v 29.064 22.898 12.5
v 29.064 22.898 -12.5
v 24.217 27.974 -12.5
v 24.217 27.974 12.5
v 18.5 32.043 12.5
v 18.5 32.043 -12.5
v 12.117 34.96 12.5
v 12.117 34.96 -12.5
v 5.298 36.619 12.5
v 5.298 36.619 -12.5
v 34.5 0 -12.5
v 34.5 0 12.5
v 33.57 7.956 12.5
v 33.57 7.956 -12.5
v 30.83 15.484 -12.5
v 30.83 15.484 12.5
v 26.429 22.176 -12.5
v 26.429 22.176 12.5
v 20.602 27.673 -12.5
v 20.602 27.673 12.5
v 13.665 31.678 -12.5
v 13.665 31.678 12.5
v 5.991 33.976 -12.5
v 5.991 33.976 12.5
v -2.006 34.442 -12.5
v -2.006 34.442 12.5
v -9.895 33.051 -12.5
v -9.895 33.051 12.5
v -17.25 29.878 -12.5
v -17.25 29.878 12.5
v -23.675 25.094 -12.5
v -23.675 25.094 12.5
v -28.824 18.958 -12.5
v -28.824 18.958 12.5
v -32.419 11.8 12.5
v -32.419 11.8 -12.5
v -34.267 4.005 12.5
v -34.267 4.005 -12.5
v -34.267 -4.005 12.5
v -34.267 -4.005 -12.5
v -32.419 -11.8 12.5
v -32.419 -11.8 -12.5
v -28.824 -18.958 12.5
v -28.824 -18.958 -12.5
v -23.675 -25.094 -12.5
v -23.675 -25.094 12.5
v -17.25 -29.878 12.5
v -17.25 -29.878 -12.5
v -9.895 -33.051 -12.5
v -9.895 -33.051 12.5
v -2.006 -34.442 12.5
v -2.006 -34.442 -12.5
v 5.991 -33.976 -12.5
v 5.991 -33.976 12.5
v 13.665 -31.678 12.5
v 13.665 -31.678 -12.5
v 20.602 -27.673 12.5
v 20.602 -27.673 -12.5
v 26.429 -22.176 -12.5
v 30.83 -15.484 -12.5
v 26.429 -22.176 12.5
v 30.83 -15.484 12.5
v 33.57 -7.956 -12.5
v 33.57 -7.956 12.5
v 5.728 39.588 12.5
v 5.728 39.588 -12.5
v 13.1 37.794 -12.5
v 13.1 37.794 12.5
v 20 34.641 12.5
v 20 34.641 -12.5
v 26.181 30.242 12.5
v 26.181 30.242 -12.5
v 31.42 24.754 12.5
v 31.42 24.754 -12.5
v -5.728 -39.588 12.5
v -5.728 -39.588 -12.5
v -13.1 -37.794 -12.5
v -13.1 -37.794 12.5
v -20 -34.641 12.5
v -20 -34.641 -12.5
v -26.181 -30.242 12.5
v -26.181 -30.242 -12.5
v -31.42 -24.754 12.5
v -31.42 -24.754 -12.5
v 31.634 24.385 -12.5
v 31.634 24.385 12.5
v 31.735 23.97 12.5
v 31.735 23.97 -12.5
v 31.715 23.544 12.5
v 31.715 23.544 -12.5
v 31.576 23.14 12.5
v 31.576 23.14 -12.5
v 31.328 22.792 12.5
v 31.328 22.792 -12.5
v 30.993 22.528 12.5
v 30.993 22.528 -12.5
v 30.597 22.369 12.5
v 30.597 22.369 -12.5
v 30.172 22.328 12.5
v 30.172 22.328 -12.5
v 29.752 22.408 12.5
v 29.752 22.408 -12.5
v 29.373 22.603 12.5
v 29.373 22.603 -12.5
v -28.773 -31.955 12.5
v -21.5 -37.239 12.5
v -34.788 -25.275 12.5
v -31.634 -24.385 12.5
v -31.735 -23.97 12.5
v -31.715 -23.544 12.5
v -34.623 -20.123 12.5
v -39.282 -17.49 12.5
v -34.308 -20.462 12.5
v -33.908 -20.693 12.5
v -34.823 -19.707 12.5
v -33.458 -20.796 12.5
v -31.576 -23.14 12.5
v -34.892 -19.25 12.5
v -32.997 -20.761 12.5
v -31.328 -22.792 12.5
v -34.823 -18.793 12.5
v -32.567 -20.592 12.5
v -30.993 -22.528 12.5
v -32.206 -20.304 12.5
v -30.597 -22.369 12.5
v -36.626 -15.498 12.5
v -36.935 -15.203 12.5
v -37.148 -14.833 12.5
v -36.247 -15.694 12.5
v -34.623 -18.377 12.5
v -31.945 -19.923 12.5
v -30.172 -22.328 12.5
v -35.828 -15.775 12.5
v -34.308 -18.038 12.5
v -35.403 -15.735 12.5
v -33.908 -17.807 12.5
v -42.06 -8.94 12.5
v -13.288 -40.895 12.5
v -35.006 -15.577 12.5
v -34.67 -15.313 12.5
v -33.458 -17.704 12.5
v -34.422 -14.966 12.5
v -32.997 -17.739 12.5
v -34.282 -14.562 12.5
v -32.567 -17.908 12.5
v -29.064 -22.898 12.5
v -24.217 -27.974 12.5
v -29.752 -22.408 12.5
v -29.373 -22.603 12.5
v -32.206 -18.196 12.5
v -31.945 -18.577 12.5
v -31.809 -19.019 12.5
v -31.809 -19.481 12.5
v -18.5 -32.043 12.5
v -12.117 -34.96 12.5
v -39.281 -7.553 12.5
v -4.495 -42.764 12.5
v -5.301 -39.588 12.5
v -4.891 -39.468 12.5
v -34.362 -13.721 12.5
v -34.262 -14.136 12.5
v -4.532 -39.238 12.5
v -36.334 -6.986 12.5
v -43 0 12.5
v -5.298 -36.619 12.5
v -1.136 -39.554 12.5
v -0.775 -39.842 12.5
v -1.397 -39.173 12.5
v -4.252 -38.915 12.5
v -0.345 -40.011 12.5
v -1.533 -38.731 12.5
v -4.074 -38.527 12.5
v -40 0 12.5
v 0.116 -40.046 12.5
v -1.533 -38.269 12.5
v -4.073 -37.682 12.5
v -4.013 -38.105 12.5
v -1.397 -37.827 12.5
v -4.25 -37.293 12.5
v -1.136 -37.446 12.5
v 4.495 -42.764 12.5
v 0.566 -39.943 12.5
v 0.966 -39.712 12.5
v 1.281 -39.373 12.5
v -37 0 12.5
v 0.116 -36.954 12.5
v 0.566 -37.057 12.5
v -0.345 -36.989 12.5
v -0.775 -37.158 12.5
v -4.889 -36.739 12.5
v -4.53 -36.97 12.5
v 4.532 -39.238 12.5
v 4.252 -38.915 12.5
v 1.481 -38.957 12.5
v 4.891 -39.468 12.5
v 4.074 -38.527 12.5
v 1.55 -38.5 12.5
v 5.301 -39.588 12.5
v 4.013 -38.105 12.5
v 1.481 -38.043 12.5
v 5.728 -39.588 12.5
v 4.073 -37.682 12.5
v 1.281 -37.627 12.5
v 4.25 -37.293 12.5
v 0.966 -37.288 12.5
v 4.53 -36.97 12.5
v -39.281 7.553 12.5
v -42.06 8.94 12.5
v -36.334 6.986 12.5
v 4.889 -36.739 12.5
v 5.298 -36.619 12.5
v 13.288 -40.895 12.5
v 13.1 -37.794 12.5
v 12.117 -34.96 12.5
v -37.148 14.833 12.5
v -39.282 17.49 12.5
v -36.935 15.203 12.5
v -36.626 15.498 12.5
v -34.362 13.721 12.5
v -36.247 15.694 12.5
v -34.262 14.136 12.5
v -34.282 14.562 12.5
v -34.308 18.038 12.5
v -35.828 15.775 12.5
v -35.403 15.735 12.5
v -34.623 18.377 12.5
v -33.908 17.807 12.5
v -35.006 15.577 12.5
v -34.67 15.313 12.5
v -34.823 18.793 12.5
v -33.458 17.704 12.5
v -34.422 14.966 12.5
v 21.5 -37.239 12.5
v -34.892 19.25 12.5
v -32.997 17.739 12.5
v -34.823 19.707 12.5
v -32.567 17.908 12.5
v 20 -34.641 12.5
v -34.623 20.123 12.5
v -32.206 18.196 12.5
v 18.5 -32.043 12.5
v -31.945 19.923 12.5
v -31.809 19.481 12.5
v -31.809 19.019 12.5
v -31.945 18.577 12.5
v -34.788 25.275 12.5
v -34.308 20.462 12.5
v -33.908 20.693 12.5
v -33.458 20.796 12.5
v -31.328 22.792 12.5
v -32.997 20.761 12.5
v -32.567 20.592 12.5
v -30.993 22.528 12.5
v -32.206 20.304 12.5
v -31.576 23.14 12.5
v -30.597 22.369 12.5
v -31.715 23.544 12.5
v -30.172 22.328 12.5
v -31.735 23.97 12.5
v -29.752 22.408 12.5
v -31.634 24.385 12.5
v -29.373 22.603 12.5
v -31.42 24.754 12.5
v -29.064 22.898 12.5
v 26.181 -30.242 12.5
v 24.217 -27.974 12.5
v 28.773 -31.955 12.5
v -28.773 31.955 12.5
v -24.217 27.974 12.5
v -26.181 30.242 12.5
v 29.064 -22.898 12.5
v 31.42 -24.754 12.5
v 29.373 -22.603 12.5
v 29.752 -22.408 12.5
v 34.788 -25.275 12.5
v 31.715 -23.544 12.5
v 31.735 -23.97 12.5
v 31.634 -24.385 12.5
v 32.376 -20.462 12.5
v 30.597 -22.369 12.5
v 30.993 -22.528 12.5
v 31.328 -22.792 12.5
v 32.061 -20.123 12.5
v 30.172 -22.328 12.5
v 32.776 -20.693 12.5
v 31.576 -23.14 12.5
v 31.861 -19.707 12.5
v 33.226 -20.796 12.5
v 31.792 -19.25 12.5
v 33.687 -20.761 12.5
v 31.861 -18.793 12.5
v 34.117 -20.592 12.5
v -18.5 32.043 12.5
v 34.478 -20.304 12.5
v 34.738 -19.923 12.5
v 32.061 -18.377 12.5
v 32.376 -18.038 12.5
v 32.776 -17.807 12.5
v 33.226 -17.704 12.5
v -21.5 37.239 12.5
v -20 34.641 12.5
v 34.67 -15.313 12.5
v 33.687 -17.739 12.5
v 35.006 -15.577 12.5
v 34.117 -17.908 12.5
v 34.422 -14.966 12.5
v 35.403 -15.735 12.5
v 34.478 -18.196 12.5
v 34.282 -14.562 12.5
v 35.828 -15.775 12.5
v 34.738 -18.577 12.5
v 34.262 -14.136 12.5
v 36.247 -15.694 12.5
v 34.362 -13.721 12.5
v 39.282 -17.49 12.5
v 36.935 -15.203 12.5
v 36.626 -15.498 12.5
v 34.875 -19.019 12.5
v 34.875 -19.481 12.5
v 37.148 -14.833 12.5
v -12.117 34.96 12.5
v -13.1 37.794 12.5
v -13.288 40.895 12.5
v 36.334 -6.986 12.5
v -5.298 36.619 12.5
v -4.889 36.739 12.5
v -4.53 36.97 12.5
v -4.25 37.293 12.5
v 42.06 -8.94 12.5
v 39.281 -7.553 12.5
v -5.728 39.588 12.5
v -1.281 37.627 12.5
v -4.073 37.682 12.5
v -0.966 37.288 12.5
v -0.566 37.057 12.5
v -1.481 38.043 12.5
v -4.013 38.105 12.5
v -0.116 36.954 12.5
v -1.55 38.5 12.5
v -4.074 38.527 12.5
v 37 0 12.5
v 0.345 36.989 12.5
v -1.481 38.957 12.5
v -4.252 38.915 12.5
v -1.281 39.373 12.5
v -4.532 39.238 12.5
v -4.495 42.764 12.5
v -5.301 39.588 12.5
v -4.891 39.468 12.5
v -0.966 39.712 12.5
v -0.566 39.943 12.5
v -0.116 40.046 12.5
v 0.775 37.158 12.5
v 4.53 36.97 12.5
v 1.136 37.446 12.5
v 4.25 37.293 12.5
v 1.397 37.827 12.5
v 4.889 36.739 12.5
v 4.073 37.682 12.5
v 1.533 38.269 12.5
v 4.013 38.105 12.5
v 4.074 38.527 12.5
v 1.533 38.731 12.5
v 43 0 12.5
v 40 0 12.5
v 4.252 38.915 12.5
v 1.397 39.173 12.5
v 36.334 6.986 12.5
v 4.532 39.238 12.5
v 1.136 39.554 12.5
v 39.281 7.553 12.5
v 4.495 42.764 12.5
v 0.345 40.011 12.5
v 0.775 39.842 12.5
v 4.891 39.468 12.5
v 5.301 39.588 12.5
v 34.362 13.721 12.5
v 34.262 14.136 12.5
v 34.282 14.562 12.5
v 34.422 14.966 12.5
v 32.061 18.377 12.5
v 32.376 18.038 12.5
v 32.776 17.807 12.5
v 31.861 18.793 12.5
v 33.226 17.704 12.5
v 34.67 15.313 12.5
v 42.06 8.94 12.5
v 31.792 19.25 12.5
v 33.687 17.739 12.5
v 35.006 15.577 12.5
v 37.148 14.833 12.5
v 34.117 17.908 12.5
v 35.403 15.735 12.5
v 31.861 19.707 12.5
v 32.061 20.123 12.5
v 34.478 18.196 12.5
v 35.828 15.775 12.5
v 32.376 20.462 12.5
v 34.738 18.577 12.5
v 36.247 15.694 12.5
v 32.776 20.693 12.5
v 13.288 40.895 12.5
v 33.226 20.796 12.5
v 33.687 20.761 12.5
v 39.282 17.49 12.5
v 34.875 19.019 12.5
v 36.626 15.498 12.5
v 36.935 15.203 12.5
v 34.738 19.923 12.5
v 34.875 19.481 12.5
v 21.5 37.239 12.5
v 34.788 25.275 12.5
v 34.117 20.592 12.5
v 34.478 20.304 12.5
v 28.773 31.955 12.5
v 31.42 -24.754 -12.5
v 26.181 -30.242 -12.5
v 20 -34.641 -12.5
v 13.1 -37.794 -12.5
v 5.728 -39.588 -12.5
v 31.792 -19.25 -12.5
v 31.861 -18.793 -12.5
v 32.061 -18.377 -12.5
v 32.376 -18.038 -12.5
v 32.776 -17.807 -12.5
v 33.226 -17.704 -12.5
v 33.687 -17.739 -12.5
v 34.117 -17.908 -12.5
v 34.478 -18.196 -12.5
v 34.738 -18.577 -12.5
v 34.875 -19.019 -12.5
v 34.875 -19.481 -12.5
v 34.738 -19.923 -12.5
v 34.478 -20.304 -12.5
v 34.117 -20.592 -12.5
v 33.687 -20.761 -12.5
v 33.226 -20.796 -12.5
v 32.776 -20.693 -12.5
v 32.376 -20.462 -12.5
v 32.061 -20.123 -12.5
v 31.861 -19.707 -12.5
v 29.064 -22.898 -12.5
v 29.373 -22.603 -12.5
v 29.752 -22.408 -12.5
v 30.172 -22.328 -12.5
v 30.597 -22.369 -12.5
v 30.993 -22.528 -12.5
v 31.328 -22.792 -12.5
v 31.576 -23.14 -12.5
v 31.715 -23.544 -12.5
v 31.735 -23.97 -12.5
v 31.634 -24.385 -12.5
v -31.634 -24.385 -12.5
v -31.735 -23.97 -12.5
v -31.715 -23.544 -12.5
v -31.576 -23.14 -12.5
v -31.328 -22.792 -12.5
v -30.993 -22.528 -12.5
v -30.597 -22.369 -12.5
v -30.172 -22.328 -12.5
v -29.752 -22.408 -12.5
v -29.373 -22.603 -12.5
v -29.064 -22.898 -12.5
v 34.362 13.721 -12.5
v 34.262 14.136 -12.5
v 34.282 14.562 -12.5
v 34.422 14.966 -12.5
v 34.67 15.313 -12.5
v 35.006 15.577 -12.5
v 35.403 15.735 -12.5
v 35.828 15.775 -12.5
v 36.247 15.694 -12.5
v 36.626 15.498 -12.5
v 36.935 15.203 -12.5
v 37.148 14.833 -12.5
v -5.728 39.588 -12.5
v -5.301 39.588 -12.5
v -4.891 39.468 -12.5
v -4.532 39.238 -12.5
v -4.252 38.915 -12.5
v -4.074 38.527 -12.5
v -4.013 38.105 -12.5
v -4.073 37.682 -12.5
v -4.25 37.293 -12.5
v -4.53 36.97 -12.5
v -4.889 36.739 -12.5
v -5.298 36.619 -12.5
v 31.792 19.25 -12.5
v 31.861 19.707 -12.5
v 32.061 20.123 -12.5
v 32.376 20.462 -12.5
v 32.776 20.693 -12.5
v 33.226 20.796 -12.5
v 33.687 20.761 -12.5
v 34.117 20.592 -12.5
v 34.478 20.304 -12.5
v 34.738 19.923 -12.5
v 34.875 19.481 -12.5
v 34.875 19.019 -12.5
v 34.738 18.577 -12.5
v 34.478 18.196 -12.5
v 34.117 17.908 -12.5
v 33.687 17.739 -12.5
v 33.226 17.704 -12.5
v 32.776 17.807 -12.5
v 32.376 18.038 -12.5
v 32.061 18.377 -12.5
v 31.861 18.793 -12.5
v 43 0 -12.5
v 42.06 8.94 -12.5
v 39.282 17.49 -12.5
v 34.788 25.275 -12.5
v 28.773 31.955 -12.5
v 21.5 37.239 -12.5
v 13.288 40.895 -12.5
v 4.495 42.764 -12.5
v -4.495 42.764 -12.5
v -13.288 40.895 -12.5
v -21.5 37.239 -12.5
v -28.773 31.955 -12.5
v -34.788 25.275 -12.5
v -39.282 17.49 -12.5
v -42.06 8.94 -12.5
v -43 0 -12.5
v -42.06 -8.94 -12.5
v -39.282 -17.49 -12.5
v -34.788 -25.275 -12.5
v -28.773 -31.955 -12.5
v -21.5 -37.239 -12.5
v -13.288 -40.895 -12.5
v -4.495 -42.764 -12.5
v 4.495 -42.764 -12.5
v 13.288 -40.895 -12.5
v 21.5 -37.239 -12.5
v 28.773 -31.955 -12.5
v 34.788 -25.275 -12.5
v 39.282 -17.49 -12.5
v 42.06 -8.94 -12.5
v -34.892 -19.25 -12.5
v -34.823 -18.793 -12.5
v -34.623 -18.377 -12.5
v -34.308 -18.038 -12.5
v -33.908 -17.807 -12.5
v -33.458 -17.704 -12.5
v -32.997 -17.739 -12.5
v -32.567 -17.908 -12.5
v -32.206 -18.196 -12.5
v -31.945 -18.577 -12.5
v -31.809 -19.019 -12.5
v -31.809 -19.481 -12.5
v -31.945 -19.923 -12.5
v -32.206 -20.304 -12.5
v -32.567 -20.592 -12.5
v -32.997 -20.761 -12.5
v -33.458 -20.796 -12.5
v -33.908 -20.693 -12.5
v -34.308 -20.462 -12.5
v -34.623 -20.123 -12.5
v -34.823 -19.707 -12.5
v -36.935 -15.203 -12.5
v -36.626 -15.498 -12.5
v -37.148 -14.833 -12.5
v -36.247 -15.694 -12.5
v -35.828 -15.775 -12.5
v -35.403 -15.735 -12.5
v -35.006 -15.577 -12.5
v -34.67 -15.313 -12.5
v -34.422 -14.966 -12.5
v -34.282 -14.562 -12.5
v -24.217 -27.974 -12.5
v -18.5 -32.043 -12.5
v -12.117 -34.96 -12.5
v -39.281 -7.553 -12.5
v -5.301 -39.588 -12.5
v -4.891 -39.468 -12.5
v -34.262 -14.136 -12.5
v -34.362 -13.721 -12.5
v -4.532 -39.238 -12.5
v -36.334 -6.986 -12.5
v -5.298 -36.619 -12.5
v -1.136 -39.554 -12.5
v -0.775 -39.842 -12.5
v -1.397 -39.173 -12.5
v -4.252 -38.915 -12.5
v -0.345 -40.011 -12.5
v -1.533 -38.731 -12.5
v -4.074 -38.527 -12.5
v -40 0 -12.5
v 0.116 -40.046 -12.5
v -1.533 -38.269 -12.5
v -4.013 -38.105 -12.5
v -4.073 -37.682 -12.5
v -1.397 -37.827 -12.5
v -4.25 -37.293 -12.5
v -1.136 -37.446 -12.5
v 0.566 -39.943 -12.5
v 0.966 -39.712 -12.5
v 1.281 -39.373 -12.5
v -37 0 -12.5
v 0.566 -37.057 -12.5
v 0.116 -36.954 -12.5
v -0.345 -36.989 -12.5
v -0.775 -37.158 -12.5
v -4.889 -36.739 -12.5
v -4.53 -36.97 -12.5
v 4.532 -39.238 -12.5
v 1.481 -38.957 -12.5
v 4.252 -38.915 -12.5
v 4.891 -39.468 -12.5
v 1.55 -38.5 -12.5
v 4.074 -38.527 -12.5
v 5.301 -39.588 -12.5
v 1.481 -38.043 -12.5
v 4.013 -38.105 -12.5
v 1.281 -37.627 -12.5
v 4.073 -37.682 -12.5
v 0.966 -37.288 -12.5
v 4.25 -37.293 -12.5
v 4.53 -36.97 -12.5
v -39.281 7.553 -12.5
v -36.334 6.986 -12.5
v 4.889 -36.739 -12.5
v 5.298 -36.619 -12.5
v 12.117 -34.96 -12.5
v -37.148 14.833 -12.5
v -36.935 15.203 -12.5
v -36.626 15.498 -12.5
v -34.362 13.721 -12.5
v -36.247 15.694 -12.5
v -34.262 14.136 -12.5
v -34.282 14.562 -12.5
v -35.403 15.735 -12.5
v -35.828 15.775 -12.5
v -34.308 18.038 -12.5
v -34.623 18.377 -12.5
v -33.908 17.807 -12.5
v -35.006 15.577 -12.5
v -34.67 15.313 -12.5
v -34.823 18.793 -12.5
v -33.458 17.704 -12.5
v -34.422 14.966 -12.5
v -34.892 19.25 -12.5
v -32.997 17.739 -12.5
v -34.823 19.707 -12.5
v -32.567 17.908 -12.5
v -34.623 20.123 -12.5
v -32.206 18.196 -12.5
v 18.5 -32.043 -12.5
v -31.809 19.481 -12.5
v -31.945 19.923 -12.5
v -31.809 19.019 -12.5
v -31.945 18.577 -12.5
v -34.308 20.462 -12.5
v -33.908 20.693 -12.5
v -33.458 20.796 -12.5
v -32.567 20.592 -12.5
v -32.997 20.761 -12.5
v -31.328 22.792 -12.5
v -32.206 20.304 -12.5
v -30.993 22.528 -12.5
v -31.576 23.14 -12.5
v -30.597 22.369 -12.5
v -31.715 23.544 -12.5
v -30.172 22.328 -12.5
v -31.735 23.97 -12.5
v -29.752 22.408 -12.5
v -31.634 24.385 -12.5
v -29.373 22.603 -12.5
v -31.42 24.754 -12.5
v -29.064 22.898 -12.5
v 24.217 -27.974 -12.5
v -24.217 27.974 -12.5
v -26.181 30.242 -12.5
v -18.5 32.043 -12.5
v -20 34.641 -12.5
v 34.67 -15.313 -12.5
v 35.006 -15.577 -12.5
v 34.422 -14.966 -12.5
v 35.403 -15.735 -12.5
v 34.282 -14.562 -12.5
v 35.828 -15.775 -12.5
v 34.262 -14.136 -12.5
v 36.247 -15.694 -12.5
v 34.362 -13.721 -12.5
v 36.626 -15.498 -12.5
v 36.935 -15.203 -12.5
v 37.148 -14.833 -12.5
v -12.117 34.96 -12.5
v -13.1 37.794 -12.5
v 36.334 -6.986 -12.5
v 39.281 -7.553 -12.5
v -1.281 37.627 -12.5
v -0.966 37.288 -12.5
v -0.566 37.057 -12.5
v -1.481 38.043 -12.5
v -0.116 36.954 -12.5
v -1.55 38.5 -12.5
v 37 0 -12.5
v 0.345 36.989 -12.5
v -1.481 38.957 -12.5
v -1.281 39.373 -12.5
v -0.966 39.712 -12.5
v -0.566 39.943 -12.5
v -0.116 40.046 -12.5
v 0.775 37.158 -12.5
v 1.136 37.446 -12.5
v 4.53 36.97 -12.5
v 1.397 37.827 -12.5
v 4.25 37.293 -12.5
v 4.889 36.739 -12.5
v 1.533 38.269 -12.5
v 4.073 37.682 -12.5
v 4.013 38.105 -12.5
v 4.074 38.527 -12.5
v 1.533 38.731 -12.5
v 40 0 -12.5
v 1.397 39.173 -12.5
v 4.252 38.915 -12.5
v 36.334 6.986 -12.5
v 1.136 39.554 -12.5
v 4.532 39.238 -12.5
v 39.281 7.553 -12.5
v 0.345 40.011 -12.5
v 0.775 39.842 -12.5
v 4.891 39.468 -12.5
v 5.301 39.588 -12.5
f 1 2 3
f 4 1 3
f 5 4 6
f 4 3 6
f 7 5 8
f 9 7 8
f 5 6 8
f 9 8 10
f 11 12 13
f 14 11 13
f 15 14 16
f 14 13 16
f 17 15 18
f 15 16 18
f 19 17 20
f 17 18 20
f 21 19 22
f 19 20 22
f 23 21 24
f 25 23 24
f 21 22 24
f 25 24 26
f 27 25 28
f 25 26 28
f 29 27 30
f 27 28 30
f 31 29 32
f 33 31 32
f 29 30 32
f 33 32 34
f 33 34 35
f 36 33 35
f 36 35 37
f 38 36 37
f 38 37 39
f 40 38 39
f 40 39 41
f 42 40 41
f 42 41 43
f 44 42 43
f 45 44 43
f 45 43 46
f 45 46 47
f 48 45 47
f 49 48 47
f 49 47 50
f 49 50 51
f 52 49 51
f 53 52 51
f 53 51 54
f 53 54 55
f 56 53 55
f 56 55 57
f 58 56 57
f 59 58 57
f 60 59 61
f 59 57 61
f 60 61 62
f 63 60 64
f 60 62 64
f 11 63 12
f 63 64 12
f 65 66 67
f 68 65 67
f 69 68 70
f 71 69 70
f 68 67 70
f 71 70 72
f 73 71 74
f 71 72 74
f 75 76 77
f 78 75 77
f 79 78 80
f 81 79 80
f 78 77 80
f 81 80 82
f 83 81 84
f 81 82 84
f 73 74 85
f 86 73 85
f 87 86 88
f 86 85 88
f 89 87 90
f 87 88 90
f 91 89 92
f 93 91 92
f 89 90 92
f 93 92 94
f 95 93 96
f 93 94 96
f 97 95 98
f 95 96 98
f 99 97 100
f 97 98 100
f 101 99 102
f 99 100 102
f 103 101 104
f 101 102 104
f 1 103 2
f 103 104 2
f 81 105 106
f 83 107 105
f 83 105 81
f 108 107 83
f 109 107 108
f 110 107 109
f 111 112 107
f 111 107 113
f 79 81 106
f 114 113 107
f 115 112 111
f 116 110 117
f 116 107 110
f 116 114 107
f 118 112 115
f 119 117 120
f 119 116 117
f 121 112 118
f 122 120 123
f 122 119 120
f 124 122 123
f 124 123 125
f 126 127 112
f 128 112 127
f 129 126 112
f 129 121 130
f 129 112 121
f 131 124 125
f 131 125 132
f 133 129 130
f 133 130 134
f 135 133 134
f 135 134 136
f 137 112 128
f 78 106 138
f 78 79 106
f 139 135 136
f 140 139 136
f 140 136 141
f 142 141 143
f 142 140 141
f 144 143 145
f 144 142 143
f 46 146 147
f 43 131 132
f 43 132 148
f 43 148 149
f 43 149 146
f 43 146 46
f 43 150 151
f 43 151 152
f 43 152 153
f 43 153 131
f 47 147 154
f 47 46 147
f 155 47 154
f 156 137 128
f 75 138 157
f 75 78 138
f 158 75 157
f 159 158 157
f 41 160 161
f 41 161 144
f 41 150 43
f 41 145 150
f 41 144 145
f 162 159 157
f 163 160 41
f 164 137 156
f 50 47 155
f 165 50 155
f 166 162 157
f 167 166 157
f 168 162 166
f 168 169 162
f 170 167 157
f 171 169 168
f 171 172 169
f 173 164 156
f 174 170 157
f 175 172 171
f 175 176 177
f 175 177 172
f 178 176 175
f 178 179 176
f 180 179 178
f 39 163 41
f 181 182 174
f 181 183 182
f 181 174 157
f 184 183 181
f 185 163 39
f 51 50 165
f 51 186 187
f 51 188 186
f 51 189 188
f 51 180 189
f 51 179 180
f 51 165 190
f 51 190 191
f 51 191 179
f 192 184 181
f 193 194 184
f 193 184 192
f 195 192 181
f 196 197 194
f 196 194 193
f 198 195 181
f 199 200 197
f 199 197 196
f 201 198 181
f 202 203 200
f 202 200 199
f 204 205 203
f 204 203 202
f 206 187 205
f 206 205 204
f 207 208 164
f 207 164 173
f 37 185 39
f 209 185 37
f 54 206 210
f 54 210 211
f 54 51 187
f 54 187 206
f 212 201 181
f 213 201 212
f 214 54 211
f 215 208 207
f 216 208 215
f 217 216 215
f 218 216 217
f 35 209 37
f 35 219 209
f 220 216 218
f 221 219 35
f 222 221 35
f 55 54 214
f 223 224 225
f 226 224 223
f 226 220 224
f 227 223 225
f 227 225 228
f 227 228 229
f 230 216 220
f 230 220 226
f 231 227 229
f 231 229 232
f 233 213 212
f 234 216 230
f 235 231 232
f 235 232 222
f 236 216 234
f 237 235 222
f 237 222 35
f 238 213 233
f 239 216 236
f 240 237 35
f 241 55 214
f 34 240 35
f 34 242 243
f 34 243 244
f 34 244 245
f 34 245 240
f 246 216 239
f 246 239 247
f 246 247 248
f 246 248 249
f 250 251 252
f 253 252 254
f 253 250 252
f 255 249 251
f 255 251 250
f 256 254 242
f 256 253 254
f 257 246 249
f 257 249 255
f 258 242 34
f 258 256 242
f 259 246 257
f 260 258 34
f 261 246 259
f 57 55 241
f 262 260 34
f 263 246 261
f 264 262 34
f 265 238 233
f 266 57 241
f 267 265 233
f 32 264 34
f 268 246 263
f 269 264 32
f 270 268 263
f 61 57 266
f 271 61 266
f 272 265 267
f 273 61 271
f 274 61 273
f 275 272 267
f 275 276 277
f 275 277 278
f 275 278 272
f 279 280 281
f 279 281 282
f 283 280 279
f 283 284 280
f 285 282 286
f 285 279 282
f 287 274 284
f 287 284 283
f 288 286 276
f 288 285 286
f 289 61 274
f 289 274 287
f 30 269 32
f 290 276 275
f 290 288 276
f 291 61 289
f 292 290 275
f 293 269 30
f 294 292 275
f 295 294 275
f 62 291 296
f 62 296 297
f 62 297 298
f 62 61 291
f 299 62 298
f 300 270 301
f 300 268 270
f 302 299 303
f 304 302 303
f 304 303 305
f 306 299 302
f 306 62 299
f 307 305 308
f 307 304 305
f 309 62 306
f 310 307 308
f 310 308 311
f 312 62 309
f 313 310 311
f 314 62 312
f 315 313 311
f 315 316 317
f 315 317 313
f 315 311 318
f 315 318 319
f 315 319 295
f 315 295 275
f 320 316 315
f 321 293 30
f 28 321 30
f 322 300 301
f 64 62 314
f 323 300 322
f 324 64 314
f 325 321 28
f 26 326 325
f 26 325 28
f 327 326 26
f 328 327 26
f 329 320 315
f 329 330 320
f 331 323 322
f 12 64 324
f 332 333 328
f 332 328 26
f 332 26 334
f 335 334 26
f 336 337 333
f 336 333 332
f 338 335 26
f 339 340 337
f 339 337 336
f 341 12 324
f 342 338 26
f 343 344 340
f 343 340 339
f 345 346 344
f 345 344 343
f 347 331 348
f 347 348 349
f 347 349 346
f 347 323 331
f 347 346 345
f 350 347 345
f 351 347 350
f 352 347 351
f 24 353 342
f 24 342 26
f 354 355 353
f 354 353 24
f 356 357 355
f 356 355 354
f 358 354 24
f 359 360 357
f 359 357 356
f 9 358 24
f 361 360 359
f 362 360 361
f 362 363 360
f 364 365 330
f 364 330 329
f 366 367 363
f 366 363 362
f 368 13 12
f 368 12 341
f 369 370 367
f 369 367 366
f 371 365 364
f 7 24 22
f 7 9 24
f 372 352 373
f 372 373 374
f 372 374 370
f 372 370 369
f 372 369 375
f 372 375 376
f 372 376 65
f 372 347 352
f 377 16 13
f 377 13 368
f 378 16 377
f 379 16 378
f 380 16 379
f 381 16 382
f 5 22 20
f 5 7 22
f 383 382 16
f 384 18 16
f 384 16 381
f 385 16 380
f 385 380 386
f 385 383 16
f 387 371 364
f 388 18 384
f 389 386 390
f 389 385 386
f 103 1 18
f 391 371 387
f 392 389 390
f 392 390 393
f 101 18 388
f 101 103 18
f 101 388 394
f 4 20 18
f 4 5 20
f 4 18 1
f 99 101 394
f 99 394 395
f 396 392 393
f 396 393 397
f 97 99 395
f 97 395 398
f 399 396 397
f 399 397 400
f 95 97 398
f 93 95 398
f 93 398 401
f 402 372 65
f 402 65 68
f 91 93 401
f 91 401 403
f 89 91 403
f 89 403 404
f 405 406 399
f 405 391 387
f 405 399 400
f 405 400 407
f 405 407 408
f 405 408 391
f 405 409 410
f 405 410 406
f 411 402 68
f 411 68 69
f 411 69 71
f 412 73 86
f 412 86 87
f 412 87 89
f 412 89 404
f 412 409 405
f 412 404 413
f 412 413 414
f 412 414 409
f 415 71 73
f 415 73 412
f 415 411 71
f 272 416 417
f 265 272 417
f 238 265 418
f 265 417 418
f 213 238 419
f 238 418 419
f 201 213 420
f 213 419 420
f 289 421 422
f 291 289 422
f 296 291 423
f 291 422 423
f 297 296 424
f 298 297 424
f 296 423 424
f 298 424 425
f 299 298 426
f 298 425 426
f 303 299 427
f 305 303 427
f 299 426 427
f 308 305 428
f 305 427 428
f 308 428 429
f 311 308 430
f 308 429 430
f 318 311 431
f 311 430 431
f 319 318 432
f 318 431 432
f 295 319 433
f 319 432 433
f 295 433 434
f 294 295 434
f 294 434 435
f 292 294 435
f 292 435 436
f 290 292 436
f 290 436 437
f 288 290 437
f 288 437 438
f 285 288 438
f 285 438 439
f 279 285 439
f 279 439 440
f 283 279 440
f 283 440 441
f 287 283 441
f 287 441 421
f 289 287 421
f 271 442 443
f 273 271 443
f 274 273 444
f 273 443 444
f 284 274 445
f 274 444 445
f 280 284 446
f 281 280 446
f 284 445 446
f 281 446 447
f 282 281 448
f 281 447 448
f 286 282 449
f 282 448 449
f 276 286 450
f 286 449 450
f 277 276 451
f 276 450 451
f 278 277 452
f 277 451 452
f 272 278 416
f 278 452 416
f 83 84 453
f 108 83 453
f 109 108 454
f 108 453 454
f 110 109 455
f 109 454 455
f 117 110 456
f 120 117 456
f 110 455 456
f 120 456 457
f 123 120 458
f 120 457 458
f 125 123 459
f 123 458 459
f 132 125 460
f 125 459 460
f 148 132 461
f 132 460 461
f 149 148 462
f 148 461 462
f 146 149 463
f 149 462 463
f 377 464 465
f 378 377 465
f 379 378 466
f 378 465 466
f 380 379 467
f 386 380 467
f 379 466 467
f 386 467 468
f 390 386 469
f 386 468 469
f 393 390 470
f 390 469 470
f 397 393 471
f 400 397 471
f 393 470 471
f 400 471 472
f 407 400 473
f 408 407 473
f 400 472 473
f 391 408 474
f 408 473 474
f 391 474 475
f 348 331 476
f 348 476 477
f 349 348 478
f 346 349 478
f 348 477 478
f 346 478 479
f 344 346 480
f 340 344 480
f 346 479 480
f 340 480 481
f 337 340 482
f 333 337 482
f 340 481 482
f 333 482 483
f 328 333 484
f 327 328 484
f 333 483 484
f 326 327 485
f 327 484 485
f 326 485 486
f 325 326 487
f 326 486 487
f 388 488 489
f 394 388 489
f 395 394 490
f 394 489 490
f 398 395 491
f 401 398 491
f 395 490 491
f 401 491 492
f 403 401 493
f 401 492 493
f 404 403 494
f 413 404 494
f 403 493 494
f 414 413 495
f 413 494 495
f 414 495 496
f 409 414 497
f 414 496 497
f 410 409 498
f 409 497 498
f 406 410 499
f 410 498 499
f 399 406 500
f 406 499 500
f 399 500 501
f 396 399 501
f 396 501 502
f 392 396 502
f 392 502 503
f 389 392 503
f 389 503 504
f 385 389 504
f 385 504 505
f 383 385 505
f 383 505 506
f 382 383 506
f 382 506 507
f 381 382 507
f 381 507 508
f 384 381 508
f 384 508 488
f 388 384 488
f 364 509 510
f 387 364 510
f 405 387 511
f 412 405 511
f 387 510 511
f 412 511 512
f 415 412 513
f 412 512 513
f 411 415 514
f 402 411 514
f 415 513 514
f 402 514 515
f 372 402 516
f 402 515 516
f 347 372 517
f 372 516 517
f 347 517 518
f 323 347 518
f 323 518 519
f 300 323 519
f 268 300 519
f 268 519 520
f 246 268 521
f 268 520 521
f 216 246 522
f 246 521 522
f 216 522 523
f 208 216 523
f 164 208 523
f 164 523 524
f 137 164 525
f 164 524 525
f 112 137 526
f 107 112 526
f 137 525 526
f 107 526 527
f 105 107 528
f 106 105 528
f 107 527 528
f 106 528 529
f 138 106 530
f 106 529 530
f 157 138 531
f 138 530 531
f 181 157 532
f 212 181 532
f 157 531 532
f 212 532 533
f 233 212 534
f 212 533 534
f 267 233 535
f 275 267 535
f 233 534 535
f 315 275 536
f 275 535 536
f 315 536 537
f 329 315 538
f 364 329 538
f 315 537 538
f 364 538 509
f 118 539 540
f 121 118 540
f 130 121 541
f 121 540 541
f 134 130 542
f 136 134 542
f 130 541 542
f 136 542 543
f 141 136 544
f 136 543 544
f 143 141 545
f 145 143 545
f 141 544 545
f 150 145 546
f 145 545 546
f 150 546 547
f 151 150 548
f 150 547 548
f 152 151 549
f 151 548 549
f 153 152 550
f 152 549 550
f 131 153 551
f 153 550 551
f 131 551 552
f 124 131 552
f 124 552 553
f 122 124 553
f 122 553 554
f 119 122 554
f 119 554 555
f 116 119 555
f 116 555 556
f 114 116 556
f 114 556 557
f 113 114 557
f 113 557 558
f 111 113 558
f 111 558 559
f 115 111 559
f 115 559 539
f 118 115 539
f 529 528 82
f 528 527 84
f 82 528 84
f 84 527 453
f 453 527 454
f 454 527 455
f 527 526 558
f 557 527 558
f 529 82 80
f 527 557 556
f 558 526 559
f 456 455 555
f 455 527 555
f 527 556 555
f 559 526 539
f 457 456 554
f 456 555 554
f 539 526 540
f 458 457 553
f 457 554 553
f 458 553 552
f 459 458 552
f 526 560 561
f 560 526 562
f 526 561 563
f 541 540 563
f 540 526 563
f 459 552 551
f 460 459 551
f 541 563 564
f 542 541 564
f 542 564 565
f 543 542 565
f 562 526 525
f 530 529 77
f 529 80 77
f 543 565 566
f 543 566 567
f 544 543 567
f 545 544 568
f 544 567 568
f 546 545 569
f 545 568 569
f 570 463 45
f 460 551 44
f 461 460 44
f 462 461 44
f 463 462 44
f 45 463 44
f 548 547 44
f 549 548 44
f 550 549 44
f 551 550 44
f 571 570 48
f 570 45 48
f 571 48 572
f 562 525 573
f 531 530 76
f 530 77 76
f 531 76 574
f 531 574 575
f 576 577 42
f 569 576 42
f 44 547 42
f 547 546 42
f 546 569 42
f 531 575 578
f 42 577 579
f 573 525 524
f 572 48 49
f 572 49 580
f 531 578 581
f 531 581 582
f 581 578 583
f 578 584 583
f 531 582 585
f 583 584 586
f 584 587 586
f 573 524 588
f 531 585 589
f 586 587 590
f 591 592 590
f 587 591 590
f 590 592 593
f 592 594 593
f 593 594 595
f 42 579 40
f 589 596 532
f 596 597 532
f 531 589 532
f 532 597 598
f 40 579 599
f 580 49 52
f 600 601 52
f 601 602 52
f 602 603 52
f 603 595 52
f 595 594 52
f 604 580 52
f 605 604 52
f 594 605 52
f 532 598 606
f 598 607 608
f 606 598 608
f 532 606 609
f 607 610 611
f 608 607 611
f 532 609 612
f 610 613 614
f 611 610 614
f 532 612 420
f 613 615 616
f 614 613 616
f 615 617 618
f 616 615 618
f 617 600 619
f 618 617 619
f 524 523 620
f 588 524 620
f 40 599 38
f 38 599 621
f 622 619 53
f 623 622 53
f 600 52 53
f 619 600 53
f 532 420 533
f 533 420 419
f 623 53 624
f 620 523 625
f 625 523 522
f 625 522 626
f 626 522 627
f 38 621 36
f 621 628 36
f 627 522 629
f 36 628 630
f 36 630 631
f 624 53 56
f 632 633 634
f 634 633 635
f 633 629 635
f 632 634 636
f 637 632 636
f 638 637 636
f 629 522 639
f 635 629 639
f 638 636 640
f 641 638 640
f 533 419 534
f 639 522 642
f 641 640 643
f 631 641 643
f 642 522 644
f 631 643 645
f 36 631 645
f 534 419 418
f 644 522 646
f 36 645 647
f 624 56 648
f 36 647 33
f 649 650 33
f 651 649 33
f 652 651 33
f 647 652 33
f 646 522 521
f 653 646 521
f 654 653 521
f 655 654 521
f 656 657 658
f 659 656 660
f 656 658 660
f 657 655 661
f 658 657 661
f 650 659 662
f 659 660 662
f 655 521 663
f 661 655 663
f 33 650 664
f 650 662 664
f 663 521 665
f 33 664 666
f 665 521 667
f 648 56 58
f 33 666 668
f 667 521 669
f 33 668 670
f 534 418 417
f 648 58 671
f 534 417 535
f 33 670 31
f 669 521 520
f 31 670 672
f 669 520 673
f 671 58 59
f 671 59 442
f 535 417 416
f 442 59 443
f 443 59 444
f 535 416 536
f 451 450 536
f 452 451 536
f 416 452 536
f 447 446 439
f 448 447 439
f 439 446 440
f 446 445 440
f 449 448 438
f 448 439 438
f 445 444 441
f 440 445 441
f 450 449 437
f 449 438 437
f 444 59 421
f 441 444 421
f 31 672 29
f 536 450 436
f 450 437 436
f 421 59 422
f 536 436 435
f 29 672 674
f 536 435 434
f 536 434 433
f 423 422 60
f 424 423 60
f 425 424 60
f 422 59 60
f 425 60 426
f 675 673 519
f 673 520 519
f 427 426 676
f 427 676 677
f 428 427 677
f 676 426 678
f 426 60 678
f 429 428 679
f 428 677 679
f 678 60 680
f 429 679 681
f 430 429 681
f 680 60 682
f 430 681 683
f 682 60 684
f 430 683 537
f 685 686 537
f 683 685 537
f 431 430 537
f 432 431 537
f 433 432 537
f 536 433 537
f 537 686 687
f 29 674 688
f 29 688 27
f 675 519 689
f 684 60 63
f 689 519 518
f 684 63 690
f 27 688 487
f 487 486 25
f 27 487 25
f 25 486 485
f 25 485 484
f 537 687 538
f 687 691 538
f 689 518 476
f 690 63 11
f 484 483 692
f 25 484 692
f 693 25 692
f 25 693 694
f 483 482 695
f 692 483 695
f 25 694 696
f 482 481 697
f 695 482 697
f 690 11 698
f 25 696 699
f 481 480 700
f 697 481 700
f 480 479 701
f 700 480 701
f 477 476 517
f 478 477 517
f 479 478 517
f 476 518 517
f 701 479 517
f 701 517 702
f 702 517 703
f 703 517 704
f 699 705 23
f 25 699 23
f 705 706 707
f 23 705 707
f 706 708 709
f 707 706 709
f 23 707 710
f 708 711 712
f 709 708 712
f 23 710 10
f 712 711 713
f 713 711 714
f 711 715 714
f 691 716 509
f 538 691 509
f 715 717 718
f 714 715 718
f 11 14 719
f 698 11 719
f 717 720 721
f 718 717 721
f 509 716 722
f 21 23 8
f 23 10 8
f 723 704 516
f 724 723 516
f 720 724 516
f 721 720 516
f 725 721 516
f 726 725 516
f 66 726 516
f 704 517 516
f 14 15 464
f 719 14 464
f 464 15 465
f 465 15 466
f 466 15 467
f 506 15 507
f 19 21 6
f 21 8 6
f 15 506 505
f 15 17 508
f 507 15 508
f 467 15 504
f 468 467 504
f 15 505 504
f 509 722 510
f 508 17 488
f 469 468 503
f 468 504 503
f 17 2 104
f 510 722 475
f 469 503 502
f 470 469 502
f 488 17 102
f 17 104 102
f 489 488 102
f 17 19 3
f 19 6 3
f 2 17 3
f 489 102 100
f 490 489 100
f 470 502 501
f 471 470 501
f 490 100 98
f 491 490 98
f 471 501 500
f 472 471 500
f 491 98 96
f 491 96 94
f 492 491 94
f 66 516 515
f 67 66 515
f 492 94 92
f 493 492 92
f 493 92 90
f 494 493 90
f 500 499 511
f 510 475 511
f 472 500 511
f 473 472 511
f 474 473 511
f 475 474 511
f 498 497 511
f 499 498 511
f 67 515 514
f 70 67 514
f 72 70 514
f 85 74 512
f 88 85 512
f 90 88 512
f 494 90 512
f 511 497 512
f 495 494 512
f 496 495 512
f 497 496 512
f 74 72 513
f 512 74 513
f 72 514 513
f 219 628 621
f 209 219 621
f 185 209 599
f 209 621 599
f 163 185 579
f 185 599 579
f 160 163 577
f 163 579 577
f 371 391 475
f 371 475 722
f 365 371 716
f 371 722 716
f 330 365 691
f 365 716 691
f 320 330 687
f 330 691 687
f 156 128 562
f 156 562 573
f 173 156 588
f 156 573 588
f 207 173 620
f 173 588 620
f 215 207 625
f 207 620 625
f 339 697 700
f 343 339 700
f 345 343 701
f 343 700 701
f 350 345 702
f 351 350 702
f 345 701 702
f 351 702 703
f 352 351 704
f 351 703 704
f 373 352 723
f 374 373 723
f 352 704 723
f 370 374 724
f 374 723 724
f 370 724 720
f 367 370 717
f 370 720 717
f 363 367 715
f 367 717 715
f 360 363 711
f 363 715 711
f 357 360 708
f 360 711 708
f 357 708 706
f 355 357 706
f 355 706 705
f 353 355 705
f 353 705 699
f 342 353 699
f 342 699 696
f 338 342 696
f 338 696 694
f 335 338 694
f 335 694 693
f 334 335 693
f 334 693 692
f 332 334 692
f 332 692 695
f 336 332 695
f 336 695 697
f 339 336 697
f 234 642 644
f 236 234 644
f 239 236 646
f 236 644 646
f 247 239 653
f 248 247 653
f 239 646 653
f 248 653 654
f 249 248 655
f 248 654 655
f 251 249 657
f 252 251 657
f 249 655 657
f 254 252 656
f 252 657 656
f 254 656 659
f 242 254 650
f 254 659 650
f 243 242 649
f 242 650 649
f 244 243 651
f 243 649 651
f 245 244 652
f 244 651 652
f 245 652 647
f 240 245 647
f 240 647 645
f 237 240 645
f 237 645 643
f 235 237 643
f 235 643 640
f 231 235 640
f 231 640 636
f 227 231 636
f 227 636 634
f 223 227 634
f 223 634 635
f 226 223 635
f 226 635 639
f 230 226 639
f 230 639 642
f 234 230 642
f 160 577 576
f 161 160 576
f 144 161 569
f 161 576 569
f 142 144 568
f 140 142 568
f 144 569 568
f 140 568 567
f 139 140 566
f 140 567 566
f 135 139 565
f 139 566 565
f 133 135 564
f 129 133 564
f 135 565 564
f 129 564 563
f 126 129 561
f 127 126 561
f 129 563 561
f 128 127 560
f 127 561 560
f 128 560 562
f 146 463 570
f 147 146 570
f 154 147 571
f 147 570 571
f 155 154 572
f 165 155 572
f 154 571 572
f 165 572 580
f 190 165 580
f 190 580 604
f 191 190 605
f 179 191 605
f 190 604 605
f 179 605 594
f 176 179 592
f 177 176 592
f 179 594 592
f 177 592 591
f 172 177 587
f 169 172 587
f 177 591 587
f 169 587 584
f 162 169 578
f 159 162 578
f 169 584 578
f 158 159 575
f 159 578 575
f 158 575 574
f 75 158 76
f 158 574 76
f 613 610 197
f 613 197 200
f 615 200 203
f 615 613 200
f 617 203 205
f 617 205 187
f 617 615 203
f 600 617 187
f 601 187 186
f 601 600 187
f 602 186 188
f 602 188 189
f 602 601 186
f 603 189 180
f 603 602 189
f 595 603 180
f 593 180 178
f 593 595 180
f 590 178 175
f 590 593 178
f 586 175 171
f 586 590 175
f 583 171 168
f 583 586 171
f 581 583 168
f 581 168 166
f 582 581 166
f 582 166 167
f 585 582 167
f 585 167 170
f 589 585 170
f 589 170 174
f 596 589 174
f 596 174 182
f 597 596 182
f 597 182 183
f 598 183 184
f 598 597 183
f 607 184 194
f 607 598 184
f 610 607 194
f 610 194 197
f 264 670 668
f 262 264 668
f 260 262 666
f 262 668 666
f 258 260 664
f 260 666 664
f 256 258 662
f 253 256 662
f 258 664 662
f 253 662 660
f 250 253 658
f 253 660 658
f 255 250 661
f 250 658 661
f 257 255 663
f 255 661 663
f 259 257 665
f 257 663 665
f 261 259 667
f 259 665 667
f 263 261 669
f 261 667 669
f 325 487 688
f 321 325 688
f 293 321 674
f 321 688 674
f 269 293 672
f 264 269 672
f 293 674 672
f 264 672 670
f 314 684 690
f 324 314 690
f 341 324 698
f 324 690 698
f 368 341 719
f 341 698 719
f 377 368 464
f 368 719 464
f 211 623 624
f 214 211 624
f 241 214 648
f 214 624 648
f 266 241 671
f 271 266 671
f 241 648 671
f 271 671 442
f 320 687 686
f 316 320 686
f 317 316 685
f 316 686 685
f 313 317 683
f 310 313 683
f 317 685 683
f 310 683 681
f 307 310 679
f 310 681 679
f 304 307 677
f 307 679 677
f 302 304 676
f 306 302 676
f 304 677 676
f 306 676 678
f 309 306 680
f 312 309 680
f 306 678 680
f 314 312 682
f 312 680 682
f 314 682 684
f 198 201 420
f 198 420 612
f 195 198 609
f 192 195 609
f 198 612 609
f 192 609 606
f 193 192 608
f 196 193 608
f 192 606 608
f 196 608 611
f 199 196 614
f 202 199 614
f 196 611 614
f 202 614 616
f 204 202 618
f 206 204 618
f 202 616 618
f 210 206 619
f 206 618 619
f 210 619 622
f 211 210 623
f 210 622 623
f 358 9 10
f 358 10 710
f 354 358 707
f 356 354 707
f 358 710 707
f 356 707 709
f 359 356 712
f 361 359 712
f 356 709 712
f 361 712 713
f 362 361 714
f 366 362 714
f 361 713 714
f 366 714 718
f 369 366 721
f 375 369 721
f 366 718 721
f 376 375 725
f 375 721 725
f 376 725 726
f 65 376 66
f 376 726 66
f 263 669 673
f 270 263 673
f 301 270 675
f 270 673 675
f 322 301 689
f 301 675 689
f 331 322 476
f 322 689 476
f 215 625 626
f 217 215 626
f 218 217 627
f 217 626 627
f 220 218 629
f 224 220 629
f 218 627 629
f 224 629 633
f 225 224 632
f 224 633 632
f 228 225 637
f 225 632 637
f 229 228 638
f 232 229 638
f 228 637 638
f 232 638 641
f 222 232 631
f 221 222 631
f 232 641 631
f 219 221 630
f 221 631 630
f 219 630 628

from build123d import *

# Parameters (mm, degrees)
HOLE_START                        = -12.5
HOLE_WIZARD_3_1_3_1_6_OUTLINE_R   = 43
HOLE_WIZARD_3_1_3_1_6_OUTLINE_R_2 = 1.55
HOLE_WIZARD_3_1_3_1_6_DEPTH       = 25
HOLE_WIZARD_3_1_3_1_5_D           = 3.1
HOLE_WIZARD_3_1_3_1_4_D           = 3.1
HOLE_WIZARD_3_1_3_1_3_D           = 3.1
HOLE_WIZARD_3_1_3_1_2_D           = 3.1
HOLE_WIZARD_3_1_3_1_1_D           = 3.1
HOLE_WIZARD_M64_1_D               = 69


with BuildPart() as part:
    # Ø3.1 (3.1) 直径孔6: read off the stored shape, not the designer's step
    # Ø3.1 (3.1) 直径孔6 outline → Ø3.1 (3.1) 直径孔6 (new body)
    with BuildSketch(Plane.XY.offset(HOLE_START)):
        Circle(HOLE_WIZARD_3_1_3_1_6_OUTLINE_R)
        with BuildLine():
            ThreePointArc((-31.420080332, -24.7543643), (-31.170115981, -22.647822626), (-29.063574308, -22.897786978))
            ThreePointArc((-29.063574308, -22.897786978), (-18.5, -32.04293994), (-5.298278059, -36.618687164))
            ThreePointArc((-5.298278059, -36.618687164), (-4.028531744, -38.318023592), (-5.727868172, -39.587769907))
            ThreePointArc((-5.727868172, -39.587769907), (-20, -34.641016151), (-31.420080332, -24.7543643))
        make_face(mode=Mode.SUBTRACT)
        with Locations((0, -38.5)):
            Circle(HOLE_WIZARD_3_1_3_1_6_OUTLINE_R_2, mode=Mode.SUBTRACT)
        with BuildLine():
            ThreePointArc((5.727868172, -39.587769907), (4.028531744, -38.318023592), (5.298278059, -36.618687164))
            ThreePointArc((5.298278059, -36.618687164), (18.5, -32.04293994), (29.063574308, -22.897786978))
            ThreePointArc((29.063574308, -22.897786978), (31.170115981, -22.647822626), (31.420080332, -24.7543643))
            ThreePointArc((31.420080332, -24.7543643), (20, -34.641016151), (5.727868172, -39.587769907))
        make_face(mode=Mode.SUBTRACT)
        with BuildLine():
            ThreePointArc((-37.147948505, 14.833405607), (-35.198647726, 15.670200965), (-34.361852367, 13.720900186))
            ThreePointArc((-34.361852367, 13.720900186), (-37, 0), (-34.361852367, -13.720900186))
            ThreePointArc((-34.361852367, -13.720900186), (-35.198647726, -15.670200965), (-37.147948505, -14.833405607))
            ThreePointArc((-37.147948505, -14.833405607), (-40, 0), (-37.147948505, 14.833405607))
        make_face(mode=Mode.SUBTRACT)
        with BuildLine():
            ThreePointArc((-5.727868172, 39.587769907), (-4.028531744, 38.318023592), (-5.298278059, 36.618687164))
            ThreePointArc((-5.298278059, 36.618687164), (-18.5, 32.04293994), (-29.063574308, 22.897786978))
            ThreePointArc((-29.063574308, 22.897786978), (-31.170115981, 22.647822626), (-31.420080332, 24.7543643))
            ThreePointArc((-31.420080332, 24.7543643), (-20, 34.641016151), (-5.727868172, 39.587769907))
        make_face(mode=Mode.SUBTRACT)
        with BuildLine():
            ThreePointArc((37.147948505, -14.833405607), (35.198647726, -15.670200965), (34.361852367, -13.720900186))
            ThreePointArc((34.361852367, -13.720900186), (37, 0), (34.361852367, 13.720900186))
            ThreePointArc((34.361852367, 13.720900186), (35.198647726, 15.670200965), (37.147948505, 14.833405607))
            ThreePointArc((37.147948505, 14.833405607), (40, 0), (37.147948505, -14.833405607))
        make_face(mode=Mode.SUBTRACT)
        with BuildLine():
            ThreePointArc((31.420080332, 24.7543643), (31.170115981, 22.647822626), (29.063574308, 22.897786978))
            ThreePointArc((29.063574308, 22.897786978), (18.5, 32.04293994), (5.298278059, 36.618687164))
            ThreePointArc((5.298278059, 36.618687164), (4.028531744, 38.318023592), (5.727868172, 39.587769907))
            ThreePointArc((5.727868172, 39.587769907), (20, 34.641016151), (31.420080332, 24.7543643))
        make_face(mode=Mode.SUBTRACT)
    extrude(amount=HOLE_WIZARD_3_1_3_1_6_DEPTH)

    # Ø3.1 (3.1) 直径孔5 (through all)
    with Locations(Plane.XY.offset(12.5)):
        with Locations((33.341978046, -19.25)):
            Hole(HOLE_WIZARD_3_1_3_1_5_D / 2)

    # Ø3.1 (3.1) 直径孔4 (through all)
    with Locations(Plane.XY.offset(12.5)):
        with Locations((33.341978046, 19.25)):
            Hole(HOLE_WIZARD_3_1_3_1_4_D / 2)

    # Ø3.1 (3.1) 直径孔3 (through all)
    with Locations(Plane.XY.offset(12.5)):
        with Locations((0, 38.5)):
            Hole(HOLE_WIZARD_3_1_3_1_3_D / 2)

    # Ø3.1 (3.1) 直径孔2 (through all)
    with Locations(Plane.XY.offset(12.5)):
        with Locations((-33.341978046, 19.25)):
            Hole(HOLE_WIZARD_3_1_3_1_2_D / 2)

    # Ø3.1 (3.1) 直径孔1 (through all)
    with Locations(Plane.XY.offset(12.5)):
        with Locations((-33.341978046, -19.25)):
            Hole(HOLE_WIZARD_3_1_3_1_1_D / 2)

    # M64 间隙孔1 (through all)
    with Locations(Plane(origin=(0, 0, -12.5), x_dir=(-1, 0, 0), z_dir=(0, 0, -1))):
        with Locations((0, 0)):
            Hole(HOLE_WIZARD_M64_1_D / 2)


solid = part.part
